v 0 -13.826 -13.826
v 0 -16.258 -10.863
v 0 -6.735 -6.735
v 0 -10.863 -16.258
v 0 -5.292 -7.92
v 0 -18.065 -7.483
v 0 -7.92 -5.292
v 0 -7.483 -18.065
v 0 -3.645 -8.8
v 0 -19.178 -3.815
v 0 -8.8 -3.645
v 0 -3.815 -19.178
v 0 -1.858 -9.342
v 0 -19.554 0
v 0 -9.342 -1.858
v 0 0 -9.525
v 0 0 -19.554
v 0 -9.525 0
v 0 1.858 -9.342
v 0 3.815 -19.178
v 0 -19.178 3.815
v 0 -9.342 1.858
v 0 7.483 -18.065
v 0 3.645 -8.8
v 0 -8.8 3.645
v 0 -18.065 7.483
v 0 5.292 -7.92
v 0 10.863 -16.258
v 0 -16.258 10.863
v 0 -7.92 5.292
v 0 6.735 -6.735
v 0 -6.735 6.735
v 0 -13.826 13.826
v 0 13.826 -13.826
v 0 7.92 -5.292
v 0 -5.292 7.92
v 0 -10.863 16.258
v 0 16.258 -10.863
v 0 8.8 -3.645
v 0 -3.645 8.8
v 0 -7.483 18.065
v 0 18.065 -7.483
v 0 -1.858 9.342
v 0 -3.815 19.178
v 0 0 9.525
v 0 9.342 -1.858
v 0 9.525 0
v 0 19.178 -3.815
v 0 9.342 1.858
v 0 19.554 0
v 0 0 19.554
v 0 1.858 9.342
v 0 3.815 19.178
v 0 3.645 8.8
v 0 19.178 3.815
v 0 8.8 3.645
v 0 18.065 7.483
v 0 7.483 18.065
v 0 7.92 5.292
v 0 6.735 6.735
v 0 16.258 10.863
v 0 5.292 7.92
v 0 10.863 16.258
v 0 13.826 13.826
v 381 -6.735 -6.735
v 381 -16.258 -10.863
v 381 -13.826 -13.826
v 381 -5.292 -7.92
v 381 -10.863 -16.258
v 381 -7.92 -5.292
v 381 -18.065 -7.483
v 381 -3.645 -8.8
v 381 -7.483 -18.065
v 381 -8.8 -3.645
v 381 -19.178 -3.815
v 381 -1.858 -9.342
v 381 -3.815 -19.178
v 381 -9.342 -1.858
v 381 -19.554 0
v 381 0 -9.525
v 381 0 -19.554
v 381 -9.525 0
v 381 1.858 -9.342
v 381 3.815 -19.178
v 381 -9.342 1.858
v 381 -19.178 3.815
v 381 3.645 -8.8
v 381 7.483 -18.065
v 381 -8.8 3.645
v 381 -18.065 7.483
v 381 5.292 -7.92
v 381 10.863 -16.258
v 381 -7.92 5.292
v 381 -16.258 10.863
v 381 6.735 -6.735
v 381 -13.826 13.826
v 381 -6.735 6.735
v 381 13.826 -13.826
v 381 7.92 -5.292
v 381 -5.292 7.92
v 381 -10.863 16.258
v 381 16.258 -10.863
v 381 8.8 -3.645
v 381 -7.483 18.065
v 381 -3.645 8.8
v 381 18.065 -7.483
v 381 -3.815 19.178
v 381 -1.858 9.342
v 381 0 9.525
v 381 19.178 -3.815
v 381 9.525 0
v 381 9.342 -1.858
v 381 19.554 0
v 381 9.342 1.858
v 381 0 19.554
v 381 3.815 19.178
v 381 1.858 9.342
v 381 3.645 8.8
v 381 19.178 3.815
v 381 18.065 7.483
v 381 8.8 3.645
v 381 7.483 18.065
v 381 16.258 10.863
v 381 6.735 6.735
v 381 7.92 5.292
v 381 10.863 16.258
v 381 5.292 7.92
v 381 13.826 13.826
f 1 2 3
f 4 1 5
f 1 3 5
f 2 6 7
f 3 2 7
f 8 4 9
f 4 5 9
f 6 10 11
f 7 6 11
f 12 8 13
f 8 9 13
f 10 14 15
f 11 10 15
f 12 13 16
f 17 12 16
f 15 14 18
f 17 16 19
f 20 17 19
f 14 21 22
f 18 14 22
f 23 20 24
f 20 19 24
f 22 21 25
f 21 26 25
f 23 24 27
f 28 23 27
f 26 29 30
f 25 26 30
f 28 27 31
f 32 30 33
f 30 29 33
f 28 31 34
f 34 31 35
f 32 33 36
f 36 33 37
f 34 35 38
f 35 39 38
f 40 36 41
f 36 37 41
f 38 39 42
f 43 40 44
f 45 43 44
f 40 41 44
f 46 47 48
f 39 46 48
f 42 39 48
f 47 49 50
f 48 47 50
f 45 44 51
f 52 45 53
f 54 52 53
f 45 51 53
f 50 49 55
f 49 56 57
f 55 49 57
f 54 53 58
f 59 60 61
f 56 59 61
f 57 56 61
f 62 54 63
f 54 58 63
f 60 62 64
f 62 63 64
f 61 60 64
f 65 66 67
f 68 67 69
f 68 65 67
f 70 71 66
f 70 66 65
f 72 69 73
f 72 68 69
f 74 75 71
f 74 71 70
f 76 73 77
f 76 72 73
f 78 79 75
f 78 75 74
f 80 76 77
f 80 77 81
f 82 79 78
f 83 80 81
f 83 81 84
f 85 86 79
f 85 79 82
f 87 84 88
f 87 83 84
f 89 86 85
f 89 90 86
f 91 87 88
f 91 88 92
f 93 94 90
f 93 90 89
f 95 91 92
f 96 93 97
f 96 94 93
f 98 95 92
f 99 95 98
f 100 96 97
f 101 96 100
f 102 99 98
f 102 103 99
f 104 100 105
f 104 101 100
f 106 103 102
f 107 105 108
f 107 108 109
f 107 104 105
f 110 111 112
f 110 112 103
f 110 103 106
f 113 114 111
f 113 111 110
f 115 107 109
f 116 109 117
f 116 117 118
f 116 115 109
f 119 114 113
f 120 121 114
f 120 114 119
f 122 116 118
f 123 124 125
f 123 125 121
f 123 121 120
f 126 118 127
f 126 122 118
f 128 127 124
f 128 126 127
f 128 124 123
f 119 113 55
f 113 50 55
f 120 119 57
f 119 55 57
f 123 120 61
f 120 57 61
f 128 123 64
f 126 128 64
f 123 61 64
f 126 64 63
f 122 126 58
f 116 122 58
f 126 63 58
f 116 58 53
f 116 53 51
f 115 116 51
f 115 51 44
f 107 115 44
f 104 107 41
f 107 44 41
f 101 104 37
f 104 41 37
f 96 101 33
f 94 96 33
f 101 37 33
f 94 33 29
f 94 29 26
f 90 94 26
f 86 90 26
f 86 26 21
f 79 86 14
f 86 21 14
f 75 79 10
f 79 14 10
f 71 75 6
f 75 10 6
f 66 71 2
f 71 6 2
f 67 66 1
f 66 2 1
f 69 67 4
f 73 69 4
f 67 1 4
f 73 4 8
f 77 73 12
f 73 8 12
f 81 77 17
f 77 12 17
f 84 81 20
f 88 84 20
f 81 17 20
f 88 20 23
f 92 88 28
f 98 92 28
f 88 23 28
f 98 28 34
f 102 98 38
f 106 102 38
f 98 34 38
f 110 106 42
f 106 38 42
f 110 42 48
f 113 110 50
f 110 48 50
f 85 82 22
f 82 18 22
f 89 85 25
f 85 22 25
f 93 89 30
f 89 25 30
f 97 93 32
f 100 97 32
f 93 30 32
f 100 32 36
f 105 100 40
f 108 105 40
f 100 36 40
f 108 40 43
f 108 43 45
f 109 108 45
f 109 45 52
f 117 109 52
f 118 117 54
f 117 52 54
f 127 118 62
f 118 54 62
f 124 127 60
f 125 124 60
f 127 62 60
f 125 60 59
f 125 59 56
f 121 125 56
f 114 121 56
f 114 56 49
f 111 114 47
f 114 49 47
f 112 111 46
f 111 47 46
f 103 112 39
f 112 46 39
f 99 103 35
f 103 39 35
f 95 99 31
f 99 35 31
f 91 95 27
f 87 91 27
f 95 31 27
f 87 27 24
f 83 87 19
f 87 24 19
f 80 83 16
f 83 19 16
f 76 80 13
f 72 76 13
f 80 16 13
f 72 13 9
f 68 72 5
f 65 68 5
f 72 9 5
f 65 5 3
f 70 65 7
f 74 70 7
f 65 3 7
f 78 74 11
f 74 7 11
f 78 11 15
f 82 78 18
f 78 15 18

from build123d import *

# Parameters (mm, degrees)
F0_R     = 19.5535243405
F1_DEPTH = 127
F3_D     = 19.05
F4_DEPTH = 254


with BuildPart() as f1:
    # F0 (on Right) → F1 (new body)
    with BuildSketch(Plane.YZ):
        Circle(F0_R)
    extrude(amount=F1_DEPTH)

    # F3 (through all)
    with Locations(Plane.YZ.offset(127)):
        with Locations((0, 0)):
            Hole(F3_D / 2)

    # F4 (add): a face of the model
    f4_faces = [f1.faces().sort_by_distance(p)[0] for p in [
        (127, -19.0004671542, 0),
    ]]
    extrude(f4_faces, amount=F4_DEPTH)


solid = f1.part
